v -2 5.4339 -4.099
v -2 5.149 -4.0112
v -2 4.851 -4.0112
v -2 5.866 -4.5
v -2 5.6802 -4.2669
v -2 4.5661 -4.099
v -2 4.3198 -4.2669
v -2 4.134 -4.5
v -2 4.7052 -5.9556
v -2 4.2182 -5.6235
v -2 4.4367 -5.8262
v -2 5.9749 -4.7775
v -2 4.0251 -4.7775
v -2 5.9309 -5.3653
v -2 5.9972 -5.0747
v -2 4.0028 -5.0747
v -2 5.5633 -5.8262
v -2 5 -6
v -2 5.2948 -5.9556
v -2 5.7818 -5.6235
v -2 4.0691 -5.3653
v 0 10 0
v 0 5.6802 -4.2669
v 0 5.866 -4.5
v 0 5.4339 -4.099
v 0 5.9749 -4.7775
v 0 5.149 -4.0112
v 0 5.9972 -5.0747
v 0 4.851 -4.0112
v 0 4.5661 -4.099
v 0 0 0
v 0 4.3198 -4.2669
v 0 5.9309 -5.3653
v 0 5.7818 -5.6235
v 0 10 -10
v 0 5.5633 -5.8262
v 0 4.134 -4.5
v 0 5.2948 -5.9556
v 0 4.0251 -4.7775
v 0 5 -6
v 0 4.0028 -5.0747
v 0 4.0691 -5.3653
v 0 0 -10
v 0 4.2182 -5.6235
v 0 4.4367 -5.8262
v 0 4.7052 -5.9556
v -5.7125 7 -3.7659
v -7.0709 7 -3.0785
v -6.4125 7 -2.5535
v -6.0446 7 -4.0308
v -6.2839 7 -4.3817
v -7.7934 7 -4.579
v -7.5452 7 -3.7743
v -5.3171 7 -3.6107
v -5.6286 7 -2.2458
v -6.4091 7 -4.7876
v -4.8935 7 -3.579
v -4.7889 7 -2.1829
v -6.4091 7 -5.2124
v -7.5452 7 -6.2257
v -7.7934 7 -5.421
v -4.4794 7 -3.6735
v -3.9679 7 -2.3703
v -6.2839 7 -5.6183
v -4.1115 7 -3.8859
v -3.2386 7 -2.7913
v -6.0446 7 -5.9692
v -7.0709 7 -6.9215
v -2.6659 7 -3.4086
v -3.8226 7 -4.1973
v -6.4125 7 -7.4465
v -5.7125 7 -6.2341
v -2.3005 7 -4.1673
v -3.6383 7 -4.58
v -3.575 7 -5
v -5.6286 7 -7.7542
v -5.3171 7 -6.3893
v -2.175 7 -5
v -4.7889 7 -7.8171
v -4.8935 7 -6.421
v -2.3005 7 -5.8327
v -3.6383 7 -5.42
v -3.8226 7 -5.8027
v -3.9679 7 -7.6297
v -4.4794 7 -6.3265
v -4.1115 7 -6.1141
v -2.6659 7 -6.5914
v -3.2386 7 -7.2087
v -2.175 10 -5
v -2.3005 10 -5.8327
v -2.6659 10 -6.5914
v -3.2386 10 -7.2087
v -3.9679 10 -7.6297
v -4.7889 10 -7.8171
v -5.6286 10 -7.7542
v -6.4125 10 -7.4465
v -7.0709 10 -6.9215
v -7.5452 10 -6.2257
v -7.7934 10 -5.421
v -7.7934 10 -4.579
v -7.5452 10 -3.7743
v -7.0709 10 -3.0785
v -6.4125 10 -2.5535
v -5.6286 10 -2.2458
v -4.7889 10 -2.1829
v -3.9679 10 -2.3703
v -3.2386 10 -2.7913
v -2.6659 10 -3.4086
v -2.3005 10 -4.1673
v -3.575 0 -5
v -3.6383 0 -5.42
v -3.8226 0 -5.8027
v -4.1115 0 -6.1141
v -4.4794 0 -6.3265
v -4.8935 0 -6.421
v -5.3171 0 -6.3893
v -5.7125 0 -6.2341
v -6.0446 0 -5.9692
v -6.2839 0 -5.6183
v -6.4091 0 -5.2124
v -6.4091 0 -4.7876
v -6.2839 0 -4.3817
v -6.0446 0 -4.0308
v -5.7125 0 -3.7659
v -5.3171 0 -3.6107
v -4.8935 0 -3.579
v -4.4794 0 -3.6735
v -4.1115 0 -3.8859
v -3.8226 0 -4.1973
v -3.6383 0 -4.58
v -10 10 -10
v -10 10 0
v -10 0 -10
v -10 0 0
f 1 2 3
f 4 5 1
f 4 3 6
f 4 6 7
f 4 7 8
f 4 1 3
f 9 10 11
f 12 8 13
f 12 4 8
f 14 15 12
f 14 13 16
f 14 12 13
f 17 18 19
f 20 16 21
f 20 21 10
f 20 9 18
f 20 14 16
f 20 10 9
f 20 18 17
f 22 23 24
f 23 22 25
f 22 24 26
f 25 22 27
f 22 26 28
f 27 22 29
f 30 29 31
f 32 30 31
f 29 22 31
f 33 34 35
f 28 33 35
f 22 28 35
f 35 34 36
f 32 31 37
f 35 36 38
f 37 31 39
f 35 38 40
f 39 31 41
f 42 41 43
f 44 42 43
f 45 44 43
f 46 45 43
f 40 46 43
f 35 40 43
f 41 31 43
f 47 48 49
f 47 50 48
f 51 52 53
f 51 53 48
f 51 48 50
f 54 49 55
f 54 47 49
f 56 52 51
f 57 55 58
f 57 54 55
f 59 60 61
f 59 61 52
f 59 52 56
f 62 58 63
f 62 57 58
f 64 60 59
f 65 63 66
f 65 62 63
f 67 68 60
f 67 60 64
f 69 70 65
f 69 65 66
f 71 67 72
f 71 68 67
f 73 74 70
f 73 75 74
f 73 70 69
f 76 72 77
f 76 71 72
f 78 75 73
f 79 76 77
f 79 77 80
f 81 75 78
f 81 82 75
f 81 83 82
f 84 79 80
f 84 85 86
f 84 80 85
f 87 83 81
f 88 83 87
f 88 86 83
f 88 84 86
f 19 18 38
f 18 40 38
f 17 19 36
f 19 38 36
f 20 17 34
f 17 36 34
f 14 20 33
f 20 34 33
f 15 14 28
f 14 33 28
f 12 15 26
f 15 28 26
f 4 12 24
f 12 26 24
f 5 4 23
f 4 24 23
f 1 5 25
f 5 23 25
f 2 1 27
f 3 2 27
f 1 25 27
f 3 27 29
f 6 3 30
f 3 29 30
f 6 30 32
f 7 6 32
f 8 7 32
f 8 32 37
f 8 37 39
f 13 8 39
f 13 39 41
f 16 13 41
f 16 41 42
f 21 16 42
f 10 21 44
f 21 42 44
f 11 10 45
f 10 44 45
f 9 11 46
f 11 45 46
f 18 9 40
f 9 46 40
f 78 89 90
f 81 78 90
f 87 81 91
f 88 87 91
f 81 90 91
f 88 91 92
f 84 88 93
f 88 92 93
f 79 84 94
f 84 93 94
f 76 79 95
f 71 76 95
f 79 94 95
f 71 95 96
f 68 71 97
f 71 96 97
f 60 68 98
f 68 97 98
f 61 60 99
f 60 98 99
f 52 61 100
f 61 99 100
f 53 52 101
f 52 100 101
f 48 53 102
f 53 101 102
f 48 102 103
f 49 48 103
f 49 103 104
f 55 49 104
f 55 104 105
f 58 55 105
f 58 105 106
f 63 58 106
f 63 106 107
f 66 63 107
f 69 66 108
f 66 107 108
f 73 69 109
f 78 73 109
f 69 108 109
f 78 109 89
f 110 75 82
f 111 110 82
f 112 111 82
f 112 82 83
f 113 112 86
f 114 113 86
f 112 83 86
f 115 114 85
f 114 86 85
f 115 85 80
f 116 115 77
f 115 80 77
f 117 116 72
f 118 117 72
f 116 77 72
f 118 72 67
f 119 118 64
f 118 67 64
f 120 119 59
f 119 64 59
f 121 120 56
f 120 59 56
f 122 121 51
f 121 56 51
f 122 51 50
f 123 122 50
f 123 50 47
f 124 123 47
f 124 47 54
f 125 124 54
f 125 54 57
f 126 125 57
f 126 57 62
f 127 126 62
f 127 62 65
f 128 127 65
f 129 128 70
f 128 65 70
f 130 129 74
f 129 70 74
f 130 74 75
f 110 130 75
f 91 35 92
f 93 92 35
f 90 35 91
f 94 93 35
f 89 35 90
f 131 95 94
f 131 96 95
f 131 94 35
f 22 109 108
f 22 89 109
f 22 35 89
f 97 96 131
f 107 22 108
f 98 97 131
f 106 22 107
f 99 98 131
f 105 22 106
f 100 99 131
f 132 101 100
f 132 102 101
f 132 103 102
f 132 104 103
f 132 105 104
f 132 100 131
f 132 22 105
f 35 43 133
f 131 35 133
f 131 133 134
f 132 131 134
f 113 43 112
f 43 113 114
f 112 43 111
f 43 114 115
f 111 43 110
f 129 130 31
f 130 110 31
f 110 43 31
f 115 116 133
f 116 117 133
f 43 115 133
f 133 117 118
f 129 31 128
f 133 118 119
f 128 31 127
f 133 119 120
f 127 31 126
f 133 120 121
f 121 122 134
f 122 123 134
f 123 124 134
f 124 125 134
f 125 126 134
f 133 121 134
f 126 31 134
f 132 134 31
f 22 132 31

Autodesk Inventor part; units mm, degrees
ref_plane "YZ Plane" through (0, 0, 0) normal (1, 0, 0) x (0, 1, 0)
ref_plane "XZ Plane" through (0, 0, 0) normal (0, 1, 0) x (-1, 0, 0)
ref_plane "XY Plane" through (0, 0, 0) normal (0, 0, 1) x (1, 0, 0)
sketch "Sketch1" plane through (0, 0, 0) normal (0, 1, 0) x (-1, 0, 0)
  line L0 (10, 0) -> (0, 0)
  line L1 (0, 0) -> (0, -10)
  line L2 (0, -10) -> (10, -10)
  line L3 (10, -10) -> (10, 0)
  dimension "d0" = 10
  dimension "d1" = 10
extrude "Extrusion1" add sketch "Sketch1" along normal blind 10
sketch "Sketch2" plane through (0, 10, 0) normal (0, 1, 0) x (1, 0, 0)
  line L0 (-10, 0) -> (0, 0) construction
  line L1 (0, 0) -> (0, 10) construction
  line L2 (0, 10) -> (-10, 10) construction
  line L3 (-10, 10) -> (-10, 0) construction
  circle A0 centre (-5, 5) radius 2.825
  dimension "d4" = 5.65
extrude "Extrusion2" cut sketch "Sketch2" against normal blind 3
sketch "Sketch3" plane through (-5, 7, -5) normal (0, 1, 0) x (1, 0, 0)
  circle A0 centre (0, 0) radius 1.425
  point P0 (5, -5)
  dimension "d7" = 2.85
extrude "Extrusion3" cut sketch "Sketch3" against normal through all
sketch "Sketch4" plane through (0, 0, 0) normal (1, 0, 0) x (0, 0, -1)
  line L0 (0, 0) -> (10, 0) construction
  line L1 (10, 0) -> (10, 10) construction
  line L2 (0, 10) -> (10, 10) construction
  line L3 (0, 0) -> (0, 10) construction
  circle A0 centre (5, 5) radius 1 construction
  circle A1 centre (5, 5) radius 1
  dimension "d10" = 2
extrude "Extrusion4" cut sketch "Sketch4" against normal blind 2
properties part number "cubo_calibracion_tornillo_1cm"
